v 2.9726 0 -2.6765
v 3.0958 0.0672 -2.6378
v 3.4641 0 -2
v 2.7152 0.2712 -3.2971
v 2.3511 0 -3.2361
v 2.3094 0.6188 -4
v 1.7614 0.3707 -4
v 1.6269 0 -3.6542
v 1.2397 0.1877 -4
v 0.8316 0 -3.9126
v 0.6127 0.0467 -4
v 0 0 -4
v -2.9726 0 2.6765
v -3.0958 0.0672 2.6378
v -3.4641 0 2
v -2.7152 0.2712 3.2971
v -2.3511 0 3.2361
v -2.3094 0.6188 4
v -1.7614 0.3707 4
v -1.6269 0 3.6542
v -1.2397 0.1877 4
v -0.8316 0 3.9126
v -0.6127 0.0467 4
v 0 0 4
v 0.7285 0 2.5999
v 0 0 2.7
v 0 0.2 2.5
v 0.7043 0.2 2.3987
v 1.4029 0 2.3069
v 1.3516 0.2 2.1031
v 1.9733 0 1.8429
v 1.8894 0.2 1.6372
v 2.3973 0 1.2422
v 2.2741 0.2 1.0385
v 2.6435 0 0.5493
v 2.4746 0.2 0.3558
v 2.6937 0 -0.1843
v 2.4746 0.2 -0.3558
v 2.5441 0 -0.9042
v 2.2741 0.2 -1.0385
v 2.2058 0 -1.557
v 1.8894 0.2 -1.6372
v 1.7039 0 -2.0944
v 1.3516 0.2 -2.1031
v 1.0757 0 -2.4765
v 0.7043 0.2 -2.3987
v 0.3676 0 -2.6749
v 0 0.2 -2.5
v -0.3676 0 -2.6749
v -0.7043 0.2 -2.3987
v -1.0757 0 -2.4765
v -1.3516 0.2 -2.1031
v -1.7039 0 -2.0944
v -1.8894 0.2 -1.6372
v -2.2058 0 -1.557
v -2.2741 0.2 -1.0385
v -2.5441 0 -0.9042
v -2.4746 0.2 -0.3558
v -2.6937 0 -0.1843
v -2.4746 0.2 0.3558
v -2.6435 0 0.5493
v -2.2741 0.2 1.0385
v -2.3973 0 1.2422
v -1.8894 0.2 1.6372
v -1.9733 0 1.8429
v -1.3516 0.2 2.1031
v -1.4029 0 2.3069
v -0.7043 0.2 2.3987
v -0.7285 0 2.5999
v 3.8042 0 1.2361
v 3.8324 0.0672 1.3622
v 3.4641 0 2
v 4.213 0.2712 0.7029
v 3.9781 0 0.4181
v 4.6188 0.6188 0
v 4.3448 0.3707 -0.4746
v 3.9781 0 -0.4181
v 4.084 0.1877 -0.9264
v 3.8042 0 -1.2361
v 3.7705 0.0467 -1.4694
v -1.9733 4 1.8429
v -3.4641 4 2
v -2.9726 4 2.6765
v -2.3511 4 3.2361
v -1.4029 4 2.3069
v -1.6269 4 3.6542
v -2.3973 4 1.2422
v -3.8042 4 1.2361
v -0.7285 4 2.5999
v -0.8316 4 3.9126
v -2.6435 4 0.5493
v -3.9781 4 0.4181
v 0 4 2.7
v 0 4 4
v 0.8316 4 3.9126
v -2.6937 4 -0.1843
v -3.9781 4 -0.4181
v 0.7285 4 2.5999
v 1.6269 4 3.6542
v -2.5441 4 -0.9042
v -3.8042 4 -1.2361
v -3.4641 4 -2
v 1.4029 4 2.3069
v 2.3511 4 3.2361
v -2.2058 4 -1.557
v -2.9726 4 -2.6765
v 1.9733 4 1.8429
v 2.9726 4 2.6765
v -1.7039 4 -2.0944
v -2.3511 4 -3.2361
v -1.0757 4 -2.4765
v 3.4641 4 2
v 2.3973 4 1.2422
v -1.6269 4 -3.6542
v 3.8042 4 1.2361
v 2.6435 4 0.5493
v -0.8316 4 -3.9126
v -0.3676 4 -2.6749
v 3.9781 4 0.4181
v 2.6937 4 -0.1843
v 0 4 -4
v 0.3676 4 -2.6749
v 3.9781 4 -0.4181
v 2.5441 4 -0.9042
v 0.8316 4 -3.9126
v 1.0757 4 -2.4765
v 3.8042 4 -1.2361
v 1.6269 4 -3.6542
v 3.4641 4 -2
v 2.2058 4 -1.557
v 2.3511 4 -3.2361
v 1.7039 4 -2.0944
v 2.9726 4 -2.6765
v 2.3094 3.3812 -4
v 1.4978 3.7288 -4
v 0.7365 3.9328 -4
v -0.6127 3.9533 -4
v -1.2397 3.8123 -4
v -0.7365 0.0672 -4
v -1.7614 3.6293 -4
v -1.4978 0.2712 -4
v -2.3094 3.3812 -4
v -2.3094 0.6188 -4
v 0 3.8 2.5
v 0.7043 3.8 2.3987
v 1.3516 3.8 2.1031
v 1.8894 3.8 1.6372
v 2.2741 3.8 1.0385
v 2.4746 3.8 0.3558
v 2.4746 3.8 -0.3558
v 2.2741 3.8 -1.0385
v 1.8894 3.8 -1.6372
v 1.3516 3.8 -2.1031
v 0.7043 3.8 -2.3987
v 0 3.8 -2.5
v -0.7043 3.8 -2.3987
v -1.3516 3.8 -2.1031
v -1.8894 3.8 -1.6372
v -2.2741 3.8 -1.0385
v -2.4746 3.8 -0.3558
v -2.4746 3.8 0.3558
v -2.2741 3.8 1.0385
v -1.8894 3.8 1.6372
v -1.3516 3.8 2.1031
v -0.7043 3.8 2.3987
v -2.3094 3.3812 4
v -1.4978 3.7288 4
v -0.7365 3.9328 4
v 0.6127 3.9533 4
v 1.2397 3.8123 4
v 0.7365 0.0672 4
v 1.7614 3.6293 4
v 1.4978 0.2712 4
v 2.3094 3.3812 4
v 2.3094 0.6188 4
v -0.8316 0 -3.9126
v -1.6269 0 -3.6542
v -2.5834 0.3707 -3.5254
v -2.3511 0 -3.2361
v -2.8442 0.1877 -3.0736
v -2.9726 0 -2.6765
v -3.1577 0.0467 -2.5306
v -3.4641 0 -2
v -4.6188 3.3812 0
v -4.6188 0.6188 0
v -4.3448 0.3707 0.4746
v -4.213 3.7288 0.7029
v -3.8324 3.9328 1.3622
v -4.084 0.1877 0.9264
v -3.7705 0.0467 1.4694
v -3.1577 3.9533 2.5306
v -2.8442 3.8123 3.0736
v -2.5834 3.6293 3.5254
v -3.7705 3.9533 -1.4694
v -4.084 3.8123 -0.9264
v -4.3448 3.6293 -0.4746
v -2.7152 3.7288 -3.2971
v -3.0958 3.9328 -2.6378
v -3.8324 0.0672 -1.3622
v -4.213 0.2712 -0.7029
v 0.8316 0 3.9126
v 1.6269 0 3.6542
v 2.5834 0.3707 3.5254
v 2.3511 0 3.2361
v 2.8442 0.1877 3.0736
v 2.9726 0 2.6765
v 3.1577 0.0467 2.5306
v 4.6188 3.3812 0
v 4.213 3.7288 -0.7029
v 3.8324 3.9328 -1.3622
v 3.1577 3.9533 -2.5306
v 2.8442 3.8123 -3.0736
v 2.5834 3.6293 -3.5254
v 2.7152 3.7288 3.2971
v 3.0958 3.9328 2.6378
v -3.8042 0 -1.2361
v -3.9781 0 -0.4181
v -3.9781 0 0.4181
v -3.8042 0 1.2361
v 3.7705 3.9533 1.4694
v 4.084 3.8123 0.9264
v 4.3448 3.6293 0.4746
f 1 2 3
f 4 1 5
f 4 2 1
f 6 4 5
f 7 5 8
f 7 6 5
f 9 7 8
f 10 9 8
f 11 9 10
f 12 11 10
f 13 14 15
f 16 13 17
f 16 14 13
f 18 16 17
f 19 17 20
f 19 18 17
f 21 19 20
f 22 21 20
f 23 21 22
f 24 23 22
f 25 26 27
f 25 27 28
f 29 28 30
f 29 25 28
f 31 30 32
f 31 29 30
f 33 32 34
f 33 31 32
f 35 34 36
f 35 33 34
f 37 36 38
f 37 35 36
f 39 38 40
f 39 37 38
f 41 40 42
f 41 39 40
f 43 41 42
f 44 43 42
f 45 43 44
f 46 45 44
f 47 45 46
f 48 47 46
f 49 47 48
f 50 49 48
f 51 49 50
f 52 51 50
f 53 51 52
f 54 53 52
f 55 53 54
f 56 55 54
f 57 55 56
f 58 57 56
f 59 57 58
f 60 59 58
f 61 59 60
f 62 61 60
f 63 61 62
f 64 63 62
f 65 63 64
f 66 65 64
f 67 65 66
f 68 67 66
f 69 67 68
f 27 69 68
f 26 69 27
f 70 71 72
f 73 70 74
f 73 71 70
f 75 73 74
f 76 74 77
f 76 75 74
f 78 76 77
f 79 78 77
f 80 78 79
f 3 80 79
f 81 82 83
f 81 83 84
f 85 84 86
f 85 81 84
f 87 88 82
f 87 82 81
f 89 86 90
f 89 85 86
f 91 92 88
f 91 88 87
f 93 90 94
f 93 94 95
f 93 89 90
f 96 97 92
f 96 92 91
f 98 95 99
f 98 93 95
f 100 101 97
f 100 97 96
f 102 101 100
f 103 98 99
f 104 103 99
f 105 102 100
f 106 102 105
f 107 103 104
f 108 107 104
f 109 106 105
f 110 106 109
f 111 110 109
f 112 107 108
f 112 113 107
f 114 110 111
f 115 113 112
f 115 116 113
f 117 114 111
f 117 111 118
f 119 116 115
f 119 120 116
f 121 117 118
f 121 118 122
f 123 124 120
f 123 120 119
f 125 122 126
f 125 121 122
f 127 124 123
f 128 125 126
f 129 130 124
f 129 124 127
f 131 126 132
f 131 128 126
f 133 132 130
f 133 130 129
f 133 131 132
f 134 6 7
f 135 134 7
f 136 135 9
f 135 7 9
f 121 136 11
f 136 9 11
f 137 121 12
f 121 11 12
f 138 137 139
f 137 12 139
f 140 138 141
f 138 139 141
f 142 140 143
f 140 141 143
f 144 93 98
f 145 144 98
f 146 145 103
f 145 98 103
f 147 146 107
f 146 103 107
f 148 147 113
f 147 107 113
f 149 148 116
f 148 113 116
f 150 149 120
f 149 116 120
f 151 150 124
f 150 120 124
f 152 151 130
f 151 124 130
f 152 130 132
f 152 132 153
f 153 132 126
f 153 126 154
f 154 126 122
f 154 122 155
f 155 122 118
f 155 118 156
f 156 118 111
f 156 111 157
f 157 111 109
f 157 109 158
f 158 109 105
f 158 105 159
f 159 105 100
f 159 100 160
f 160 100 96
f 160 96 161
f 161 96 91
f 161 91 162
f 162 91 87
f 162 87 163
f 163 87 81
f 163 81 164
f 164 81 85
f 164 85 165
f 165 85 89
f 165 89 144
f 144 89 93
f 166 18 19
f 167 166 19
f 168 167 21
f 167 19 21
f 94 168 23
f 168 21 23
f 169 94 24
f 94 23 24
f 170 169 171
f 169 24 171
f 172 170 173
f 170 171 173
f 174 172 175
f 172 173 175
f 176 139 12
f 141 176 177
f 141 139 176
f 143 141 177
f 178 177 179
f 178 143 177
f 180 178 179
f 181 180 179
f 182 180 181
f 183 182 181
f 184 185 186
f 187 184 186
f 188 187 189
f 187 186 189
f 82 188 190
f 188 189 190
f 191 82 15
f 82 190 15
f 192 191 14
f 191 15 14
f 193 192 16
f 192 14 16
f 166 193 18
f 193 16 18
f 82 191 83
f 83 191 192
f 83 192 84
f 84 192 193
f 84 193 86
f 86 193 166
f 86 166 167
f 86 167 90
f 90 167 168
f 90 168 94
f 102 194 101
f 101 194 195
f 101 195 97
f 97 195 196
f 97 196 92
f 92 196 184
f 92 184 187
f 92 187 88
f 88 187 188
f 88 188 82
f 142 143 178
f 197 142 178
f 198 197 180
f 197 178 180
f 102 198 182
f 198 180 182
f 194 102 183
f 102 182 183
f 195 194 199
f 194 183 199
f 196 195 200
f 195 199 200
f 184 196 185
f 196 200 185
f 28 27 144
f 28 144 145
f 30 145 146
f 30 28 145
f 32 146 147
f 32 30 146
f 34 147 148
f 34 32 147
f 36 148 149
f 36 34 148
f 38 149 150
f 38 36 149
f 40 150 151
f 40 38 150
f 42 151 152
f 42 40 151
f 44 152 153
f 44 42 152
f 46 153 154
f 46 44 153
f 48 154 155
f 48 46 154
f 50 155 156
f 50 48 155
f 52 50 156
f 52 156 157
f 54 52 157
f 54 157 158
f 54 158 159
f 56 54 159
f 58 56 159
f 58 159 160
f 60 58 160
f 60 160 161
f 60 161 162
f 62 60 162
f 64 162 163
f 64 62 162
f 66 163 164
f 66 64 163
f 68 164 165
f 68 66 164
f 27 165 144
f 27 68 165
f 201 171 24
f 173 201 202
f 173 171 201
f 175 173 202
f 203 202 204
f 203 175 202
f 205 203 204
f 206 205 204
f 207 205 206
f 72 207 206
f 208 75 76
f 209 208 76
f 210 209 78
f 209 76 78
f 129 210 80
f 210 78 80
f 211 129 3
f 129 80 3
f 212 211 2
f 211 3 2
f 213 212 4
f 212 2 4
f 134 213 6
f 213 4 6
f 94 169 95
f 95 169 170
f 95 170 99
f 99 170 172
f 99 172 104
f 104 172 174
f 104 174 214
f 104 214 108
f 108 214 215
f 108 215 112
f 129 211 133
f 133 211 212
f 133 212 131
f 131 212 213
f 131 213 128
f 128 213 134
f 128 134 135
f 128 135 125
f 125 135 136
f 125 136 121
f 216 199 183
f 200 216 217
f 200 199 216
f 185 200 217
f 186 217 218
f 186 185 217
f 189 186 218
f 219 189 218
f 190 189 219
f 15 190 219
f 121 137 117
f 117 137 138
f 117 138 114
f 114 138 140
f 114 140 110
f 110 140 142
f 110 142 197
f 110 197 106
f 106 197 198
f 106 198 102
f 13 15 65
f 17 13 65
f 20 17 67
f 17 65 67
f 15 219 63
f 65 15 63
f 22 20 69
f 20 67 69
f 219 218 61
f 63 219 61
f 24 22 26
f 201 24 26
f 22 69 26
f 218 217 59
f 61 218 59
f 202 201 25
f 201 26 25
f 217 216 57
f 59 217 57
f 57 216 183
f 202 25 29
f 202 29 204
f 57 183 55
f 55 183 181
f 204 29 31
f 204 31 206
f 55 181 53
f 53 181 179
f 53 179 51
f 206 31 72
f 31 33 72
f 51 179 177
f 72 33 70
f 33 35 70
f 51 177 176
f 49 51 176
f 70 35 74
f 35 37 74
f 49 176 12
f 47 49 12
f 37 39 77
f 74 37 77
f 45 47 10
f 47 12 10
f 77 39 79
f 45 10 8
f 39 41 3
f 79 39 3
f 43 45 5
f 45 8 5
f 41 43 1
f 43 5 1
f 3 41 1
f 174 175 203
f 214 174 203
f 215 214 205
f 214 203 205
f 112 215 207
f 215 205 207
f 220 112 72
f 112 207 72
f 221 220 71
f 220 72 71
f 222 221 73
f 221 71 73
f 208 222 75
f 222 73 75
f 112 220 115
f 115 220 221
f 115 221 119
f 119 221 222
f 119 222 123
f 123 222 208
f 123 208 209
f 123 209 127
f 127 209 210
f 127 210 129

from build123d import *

# Parameters (mm, degrees)
SKETCH1_R           = 2.5
BOSS_EXTRUDE1_DEPTH = 4
CHAMFER1_SIZE       = 0.2


with BuildPart() as part:
    # Sketch1 → Boss-Extrude1 (new body)
    with BuildSketch(Plane(origin=(0, 0, 0), x_dir=(1, 0, 0), z_dir=(0, 1, 0))):
        Polygon((-2.309401077, 4), (-4.618802154, 0), (-2.309401077, -4), (2.309401077, -4), (4.618802154, 0), (2.309401077, 4), align=None)
        with Locations(Location((0, 0, 0), (0, 0, 270))):
            Circle(SKETCH1_R, mode=Mode.SUBTRACT)
    extrude(amount=BOSS_EXTRUDE1_DEPTH)

    # Chamfer1
    chamfer1_edges = [part.edges().sort_by_distance(p)[0] for p in [
        (0, 0, -2.5),
        (0, 4, -2.5),
    ]]
    chamfer(chamfer1_edges, length=CHAMFER1_SIZE)

    # Sketch2 → Cut-Revolve1 (revolve, cut)
    with BuildSketch(Plane.XY):
        Polygon((-4, 4), (-5, 3), (-5, 4), align=None)
        Polygon((-5, 0), (-4, 0), (-5, 1), align=None)
    revolve(axis=Axis((0, 0, 0), (0, 1, 0)), mode=Mode.SUBTRACT)


solid = part.part
